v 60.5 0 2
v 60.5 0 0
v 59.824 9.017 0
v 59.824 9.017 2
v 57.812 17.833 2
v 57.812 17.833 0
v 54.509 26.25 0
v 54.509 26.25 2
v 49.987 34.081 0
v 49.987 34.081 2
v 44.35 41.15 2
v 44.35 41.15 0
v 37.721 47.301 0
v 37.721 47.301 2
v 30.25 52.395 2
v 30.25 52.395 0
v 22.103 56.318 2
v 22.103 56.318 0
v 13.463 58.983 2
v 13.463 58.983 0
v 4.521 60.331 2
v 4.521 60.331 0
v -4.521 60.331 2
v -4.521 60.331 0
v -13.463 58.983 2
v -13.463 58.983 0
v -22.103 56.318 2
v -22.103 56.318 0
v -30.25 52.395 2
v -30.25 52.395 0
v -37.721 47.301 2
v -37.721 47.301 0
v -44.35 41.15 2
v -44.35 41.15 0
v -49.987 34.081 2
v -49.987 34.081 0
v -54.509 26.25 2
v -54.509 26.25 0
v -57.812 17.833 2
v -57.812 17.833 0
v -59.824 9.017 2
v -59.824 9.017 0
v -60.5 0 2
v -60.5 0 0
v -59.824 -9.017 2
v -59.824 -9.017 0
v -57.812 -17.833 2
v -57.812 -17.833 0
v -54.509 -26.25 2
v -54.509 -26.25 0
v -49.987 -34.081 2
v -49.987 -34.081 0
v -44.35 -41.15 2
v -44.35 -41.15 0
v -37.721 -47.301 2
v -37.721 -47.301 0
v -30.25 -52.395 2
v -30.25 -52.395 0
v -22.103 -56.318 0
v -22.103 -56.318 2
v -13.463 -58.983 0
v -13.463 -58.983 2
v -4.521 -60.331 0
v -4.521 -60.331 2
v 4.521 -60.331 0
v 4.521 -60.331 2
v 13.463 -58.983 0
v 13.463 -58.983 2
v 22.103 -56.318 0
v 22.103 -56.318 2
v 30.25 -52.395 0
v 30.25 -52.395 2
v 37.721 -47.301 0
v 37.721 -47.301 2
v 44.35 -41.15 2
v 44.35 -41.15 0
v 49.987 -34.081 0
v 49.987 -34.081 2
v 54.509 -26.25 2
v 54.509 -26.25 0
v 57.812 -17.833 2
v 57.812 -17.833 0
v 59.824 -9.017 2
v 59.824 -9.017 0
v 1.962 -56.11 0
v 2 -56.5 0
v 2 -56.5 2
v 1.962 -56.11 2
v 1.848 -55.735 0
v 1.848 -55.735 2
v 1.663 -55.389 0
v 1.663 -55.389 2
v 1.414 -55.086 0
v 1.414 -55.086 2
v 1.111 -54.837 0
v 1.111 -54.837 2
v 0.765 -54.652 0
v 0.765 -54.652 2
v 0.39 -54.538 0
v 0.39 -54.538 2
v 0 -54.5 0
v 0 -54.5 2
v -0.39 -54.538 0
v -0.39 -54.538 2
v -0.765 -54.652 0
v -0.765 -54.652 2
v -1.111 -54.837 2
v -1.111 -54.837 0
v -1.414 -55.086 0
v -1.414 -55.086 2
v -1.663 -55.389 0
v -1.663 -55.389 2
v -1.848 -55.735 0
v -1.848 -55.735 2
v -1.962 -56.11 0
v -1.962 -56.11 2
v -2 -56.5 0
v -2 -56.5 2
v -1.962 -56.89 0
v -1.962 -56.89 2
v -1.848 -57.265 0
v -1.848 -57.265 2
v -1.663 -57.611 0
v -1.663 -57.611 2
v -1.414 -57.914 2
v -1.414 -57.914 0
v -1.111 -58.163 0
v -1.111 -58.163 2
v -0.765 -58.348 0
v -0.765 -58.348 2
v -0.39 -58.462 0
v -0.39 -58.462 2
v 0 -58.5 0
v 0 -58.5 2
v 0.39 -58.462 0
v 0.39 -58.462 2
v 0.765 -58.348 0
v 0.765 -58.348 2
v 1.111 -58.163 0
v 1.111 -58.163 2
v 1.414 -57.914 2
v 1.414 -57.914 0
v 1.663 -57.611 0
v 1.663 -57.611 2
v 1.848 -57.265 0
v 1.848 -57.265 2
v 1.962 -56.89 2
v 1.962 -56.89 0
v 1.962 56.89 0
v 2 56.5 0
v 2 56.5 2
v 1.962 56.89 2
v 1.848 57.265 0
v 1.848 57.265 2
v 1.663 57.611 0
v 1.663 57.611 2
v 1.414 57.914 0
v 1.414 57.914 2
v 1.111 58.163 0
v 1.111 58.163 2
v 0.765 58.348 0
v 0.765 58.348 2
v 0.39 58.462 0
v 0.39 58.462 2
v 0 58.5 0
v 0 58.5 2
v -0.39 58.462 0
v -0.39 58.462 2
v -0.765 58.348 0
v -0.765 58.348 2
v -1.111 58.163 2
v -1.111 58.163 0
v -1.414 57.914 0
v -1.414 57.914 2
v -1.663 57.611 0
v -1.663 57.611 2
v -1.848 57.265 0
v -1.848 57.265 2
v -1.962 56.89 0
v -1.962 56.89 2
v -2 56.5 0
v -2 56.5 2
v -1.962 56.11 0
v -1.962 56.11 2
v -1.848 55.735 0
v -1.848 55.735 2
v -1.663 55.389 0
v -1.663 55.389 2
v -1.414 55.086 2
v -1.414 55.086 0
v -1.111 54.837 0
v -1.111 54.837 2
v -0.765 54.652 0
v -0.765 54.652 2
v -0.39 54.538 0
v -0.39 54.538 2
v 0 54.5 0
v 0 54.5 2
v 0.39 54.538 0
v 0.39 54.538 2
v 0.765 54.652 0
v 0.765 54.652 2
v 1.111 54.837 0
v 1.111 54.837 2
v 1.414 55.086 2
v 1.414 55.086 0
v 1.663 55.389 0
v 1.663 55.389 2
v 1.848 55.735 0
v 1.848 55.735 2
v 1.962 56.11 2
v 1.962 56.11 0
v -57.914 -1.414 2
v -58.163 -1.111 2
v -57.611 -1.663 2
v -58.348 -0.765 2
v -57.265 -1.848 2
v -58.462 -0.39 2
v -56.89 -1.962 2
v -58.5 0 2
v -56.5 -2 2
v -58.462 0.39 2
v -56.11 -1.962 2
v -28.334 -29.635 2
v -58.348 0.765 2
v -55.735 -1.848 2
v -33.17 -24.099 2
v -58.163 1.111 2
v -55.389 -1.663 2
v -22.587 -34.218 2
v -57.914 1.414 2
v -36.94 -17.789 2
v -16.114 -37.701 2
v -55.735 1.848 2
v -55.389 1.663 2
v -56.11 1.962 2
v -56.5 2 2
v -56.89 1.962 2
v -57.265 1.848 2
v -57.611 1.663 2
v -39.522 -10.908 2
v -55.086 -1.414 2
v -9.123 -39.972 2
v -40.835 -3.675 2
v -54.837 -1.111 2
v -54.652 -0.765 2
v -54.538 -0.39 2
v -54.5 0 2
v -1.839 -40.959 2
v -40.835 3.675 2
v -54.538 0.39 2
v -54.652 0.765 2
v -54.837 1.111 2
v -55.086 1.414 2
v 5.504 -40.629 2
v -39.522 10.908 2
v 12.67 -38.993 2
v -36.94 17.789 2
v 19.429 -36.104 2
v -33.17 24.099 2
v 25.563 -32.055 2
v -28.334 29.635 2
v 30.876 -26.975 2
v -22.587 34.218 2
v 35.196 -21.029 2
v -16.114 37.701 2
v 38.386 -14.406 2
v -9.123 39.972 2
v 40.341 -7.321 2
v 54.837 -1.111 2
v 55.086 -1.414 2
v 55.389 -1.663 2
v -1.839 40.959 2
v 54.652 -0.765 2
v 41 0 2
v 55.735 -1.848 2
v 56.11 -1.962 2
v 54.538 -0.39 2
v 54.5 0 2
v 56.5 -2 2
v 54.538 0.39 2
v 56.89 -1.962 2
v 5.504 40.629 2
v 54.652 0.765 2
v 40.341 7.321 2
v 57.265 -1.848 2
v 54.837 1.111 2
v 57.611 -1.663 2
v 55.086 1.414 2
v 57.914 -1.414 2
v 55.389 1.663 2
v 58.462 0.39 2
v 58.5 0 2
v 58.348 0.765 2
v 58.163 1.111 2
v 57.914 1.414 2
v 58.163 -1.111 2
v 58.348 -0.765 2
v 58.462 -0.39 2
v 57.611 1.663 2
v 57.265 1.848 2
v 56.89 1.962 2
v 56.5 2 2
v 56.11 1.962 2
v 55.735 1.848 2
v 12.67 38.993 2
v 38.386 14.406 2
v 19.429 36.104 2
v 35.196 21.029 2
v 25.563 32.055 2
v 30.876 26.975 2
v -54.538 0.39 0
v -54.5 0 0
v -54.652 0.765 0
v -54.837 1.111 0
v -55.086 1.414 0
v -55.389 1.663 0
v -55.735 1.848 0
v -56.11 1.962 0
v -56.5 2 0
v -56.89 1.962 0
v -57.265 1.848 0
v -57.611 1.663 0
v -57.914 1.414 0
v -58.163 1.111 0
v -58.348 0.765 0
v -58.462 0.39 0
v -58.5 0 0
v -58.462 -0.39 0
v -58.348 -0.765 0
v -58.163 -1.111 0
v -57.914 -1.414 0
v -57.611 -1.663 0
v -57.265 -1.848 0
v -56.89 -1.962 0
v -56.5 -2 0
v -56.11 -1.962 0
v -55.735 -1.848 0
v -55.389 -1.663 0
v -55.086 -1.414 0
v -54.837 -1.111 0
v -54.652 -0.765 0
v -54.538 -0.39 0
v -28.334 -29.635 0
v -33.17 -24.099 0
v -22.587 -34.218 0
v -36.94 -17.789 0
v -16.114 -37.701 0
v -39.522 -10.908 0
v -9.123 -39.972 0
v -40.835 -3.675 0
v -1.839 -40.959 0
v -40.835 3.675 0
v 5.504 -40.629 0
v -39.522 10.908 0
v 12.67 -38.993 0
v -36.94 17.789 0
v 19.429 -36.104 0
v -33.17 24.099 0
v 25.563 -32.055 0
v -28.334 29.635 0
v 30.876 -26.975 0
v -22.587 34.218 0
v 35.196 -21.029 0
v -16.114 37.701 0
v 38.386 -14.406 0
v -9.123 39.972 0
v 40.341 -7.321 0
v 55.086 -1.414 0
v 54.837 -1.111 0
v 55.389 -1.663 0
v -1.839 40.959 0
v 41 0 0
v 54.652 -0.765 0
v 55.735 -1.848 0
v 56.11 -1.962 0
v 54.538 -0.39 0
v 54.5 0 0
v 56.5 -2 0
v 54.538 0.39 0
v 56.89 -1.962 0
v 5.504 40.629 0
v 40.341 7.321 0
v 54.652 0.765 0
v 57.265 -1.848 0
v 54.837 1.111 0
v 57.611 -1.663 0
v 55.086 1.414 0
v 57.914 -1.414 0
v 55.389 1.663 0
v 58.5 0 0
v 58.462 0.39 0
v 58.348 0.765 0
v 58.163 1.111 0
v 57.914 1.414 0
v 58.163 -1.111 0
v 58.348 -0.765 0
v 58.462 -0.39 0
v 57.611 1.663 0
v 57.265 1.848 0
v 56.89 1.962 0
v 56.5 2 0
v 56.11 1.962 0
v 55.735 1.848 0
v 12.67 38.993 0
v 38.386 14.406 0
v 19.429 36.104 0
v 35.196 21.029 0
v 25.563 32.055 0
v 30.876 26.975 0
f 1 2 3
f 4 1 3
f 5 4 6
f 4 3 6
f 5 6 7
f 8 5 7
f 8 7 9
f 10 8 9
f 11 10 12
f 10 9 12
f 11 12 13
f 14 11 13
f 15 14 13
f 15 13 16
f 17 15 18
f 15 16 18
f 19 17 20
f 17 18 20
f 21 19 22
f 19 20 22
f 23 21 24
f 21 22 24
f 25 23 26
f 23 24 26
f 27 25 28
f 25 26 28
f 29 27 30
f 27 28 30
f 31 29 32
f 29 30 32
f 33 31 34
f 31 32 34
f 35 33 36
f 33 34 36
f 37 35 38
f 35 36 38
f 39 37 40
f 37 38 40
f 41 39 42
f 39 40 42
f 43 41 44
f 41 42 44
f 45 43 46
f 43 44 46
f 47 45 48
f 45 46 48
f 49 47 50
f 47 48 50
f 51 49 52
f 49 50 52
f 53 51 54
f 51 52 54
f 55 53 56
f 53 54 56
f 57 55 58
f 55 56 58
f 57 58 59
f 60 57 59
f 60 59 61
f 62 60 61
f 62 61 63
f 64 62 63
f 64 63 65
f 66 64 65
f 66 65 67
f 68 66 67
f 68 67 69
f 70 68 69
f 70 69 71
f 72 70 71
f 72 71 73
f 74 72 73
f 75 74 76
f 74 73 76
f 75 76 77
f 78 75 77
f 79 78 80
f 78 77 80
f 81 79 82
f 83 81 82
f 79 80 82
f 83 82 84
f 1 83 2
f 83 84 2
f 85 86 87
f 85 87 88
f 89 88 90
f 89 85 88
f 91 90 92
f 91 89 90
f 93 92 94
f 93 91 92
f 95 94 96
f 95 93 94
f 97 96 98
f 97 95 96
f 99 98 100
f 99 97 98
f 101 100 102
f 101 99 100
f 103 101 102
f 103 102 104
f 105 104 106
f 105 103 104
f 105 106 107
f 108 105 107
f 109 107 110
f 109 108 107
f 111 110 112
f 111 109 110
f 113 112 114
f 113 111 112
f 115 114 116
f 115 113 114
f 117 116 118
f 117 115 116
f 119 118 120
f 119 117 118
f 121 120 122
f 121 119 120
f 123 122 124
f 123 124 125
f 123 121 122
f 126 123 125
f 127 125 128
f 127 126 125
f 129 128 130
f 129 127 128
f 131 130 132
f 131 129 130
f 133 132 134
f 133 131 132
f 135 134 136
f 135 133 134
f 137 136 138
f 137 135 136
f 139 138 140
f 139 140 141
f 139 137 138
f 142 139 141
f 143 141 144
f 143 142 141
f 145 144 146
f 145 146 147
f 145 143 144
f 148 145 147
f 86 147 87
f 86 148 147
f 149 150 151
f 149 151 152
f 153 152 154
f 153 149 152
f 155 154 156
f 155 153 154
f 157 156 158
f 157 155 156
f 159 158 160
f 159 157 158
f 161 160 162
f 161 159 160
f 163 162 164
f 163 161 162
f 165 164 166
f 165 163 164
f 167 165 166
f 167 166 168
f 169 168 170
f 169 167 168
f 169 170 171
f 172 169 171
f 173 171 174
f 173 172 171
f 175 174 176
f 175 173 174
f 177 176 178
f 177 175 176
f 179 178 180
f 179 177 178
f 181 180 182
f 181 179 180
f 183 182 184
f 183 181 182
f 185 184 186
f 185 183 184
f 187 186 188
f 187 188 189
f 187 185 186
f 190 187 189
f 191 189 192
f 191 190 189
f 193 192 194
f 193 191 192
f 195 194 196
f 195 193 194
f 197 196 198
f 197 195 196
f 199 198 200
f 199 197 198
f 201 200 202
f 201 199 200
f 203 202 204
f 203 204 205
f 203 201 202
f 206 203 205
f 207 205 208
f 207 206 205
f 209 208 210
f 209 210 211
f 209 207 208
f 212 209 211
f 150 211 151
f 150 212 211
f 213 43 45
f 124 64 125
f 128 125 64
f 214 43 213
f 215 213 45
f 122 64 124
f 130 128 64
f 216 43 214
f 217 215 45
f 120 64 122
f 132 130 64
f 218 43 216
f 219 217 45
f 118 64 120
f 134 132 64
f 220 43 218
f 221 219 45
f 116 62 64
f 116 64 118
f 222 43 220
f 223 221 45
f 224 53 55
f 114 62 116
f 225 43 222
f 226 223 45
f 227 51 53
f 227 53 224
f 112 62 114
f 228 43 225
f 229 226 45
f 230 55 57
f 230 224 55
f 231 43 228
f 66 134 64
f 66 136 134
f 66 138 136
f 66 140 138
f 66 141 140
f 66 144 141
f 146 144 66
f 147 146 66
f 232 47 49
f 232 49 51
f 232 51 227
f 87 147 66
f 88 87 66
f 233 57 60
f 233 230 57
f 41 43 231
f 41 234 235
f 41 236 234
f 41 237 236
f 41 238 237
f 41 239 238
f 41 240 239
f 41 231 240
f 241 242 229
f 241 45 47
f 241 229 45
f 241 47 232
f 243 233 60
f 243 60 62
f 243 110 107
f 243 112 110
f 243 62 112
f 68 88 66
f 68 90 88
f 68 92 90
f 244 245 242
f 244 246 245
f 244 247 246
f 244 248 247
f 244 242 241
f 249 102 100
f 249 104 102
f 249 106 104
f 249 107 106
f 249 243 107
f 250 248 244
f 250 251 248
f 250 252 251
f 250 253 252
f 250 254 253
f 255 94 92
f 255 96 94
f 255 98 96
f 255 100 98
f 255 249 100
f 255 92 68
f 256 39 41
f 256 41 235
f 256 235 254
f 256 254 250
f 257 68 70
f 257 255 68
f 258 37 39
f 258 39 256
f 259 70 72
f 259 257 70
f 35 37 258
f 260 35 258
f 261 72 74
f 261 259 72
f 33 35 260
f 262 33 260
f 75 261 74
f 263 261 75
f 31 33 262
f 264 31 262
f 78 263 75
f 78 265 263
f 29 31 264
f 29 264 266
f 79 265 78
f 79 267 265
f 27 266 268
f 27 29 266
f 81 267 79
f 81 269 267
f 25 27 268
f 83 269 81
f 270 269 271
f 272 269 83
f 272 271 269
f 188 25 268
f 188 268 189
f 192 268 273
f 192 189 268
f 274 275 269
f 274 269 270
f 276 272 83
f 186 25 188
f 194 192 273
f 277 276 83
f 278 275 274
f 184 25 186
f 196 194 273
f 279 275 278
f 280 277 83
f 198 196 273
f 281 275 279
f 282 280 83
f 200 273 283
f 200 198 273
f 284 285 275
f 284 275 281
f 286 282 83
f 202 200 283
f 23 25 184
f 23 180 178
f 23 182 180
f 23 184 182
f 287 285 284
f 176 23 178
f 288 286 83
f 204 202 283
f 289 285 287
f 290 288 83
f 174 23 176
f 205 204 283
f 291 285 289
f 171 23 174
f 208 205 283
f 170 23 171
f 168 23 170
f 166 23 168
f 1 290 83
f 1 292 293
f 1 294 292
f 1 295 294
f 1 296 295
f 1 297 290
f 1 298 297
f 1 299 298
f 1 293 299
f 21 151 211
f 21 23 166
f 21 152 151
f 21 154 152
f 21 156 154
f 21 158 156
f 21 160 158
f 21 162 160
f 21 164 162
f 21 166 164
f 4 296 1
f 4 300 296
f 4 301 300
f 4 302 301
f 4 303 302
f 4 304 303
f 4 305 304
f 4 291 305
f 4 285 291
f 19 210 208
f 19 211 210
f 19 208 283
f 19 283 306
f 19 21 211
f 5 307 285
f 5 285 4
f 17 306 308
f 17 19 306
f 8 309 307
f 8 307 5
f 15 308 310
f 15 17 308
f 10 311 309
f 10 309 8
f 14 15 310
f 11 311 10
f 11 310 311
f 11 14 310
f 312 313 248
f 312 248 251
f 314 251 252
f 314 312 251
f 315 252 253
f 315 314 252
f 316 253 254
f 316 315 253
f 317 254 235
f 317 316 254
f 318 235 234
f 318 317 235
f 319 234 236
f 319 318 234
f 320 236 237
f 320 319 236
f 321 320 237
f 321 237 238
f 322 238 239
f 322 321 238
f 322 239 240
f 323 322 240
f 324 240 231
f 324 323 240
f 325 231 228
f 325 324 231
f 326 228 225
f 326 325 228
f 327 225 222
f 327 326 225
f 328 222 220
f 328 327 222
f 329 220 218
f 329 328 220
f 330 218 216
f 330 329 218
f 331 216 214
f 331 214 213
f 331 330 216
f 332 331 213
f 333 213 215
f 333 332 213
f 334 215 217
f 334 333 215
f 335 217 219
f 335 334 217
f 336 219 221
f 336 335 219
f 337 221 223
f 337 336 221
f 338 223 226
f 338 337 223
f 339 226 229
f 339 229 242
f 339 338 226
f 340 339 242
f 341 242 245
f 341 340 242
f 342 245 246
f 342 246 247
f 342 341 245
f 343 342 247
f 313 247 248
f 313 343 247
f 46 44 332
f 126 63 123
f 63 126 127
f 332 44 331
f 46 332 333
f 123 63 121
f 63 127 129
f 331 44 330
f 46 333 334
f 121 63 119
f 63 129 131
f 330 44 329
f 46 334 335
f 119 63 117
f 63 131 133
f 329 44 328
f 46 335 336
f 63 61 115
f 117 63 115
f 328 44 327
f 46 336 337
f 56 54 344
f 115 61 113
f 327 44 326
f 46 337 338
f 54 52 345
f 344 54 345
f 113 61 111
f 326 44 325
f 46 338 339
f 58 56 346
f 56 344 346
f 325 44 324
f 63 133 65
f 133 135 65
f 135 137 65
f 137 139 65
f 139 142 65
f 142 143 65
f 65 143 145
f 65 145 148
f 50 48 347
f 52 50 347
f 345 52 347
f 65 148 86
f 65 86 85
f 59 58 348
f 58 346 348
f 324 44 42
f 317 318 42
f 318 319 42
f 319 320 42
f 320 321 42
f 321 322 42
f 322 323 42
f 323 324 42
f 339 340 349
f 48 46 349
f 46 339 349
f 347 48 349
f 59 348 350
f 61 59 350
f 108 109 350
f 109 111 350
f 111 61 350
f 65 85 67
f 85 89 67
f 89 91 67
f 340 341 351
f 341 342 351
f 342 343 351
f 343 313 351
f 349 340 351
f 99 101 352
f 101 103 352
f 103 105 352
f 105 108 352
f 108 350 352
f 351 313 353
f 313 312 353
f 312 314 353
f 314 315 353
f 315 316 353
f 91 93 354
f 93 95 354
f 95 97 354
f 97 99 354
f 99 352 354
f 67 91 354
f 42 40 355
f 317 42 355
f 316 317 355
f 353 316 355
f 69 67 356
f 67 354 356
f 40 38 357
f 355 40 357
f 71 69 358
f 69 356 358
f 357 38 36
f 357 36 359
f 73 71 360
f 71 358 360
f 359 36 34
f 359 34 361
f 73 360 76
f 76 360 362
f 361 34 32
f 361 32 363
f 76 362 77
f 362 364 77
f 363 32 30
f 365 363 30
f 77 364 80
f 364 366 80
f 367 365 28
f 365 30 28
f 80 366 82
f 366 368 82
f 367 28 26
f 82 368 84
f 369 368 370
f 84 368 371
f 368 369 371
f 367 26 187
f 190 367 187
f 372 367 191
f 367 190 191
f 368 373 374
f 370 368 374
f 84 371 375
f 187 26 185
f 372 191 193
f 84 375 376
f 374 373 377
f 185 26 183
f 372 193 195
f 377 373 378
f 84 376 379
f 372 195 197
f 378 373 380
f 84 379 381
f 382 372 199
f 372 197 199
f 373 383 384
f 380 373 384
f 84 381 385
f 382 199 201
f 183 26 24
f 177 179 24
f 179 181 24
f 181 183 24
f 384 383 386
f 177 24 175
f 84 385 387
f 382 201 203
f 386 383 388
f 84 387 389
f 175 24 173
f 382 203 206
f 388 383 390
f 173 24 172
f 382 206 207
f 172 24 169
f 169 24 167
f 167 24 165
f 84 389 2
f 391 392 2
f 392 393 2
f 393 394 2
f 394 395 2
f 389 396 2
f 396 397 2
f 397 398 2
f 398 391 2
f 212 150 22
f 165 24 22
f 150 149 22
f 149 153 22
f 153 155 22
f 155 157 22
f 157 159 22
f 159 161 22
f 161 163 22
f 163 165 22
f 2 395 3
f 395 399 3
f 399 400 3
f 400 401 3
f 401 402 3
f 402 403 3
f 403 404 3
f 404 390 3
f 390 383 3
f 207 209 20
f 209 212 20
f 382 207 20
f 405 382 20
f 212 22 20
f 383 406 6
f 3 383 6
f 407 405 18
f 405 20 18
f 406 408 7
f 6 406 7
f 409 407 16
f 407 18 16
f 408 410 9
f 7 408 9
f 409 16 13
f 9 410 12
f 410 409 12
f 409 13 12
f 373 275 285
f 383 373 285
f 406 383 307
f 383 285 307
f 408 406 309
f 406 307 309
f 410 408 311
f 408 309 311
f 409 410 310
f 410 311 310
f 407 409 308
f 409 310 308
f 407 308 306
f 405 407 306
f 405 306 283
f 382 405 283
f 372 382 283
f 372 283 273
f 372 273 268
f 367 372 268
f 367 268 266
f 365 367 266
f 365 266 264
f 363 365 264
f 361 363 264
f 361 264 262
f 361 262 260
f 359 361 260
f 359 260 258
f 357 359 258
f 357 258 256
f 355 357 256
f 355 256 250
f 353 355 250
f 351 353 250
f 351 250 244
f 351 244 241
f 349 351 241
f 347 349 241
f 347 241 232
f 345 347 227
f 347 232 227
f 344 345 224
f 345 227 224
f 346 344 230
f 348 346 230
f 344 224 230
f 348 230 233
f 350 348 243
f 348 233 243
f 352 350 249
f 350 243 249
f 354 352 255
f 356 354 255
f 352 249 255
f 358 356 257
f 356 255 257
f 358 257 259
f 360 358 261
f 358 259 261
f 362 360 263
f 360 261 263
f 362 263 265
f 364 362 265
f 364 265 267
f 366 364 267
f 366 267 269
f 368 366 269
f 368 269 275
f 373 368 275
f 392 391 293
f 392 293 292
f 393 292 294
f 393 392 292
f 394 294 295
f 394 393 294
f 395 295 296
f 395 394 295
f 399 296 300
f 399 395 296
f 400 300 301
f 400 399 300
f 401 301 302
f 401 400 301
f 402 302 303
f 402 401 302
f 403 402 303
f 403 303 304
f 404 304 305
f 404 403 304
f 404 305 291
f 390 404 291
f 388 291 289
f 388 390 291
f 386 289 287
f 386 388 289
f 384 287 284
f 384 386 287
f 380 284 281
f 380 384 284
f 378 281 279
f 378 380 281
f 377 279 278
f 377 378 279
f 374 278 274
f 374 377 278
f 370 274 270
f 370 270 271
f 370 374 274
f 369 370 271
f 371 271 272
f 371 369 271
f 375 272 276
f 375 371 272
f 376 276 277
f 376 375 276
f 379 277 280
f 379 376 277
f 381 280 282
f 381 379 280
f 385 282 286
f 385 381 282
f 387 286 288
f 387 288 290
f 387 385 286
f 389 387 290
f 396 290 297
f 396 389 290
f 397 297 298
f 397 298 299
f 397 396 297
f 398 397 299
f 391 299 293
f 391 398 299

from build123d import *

# Parameters (mm, degrees)
SKETCH_1_R          = 60.5
SKETCH_1_R_2        = 2
SKETCH_1_R_3        = 2.6
SKETCH_1_R_4        = 15.5
EXTRUDE_1_DEPTH     = 2
SKETCH_2_R          = 41
CUT_EXTRUDE_1_DEPTH = 10


with BuildPart() as part:
    # 草图1 → 凸台-拉伸1 (new body)
    with BuildSketch(Plane.XY):
        Circle(SKETCH_1_R)
        with Locations((0, -56.5)):
            Circle(SKETCH_1_R_2, mode=Mode.SUBTRACT)
        with Locations((-56.5, 0)):
            Circle(SKETCH_1_R_2, mode=Mode.SUBTRACT)
        with Locations((0, 56.5)):
            Circle(SKETCH_1_R_2, mode=Mode.SUBTRACT)
        with Locations((56.5, 0)):
            Circle(SKETCH_1_R_2, mode=Mode.SUBTRACT)
        with Locations((0, -23.75)):
            Circle(SKETCH_1_R_3, mode=Mode.SUBTRACT)
        with Locations((-20.56810334, 11.875)):
            Circle(SKETCH_1_R_3, mode=Mode.SUBTRACT)
        with Locations((20.56810334, 11.875)):
            Circle(SKETCH_1_R_3, mode=Mode.SUBTRACT)
        with Locations((19.485571585, -11.25)):
            Circle(SKETCH_1_R_3, mode=Mode.SUBTRACT)
        with Locations((-19.485571585, -11.25)):
            Circle(SKETCH_1_R_3, mode=Mode.SUBTRACT)
        with Locations((0, 22.5)):
            Circle(SKETCH_1_R_3, mode=Mode.SUBTRACT)
        Circle(SKETCH_1_R_4, mode=Mode.SUBTRACT)
    extrude(amount=EXTRUDE_1_DEPTH)

    # 草图2 → 切除-拉伸1 (cut)
    with BuildSketch(Plane.XY.offset(2)):
        Circle(SKETCH_2_R)
    extrude(amount=-CUT_EXTRUDE_1_DEPTH, mode=Mode.SUBTRACT)


solid = part.part
